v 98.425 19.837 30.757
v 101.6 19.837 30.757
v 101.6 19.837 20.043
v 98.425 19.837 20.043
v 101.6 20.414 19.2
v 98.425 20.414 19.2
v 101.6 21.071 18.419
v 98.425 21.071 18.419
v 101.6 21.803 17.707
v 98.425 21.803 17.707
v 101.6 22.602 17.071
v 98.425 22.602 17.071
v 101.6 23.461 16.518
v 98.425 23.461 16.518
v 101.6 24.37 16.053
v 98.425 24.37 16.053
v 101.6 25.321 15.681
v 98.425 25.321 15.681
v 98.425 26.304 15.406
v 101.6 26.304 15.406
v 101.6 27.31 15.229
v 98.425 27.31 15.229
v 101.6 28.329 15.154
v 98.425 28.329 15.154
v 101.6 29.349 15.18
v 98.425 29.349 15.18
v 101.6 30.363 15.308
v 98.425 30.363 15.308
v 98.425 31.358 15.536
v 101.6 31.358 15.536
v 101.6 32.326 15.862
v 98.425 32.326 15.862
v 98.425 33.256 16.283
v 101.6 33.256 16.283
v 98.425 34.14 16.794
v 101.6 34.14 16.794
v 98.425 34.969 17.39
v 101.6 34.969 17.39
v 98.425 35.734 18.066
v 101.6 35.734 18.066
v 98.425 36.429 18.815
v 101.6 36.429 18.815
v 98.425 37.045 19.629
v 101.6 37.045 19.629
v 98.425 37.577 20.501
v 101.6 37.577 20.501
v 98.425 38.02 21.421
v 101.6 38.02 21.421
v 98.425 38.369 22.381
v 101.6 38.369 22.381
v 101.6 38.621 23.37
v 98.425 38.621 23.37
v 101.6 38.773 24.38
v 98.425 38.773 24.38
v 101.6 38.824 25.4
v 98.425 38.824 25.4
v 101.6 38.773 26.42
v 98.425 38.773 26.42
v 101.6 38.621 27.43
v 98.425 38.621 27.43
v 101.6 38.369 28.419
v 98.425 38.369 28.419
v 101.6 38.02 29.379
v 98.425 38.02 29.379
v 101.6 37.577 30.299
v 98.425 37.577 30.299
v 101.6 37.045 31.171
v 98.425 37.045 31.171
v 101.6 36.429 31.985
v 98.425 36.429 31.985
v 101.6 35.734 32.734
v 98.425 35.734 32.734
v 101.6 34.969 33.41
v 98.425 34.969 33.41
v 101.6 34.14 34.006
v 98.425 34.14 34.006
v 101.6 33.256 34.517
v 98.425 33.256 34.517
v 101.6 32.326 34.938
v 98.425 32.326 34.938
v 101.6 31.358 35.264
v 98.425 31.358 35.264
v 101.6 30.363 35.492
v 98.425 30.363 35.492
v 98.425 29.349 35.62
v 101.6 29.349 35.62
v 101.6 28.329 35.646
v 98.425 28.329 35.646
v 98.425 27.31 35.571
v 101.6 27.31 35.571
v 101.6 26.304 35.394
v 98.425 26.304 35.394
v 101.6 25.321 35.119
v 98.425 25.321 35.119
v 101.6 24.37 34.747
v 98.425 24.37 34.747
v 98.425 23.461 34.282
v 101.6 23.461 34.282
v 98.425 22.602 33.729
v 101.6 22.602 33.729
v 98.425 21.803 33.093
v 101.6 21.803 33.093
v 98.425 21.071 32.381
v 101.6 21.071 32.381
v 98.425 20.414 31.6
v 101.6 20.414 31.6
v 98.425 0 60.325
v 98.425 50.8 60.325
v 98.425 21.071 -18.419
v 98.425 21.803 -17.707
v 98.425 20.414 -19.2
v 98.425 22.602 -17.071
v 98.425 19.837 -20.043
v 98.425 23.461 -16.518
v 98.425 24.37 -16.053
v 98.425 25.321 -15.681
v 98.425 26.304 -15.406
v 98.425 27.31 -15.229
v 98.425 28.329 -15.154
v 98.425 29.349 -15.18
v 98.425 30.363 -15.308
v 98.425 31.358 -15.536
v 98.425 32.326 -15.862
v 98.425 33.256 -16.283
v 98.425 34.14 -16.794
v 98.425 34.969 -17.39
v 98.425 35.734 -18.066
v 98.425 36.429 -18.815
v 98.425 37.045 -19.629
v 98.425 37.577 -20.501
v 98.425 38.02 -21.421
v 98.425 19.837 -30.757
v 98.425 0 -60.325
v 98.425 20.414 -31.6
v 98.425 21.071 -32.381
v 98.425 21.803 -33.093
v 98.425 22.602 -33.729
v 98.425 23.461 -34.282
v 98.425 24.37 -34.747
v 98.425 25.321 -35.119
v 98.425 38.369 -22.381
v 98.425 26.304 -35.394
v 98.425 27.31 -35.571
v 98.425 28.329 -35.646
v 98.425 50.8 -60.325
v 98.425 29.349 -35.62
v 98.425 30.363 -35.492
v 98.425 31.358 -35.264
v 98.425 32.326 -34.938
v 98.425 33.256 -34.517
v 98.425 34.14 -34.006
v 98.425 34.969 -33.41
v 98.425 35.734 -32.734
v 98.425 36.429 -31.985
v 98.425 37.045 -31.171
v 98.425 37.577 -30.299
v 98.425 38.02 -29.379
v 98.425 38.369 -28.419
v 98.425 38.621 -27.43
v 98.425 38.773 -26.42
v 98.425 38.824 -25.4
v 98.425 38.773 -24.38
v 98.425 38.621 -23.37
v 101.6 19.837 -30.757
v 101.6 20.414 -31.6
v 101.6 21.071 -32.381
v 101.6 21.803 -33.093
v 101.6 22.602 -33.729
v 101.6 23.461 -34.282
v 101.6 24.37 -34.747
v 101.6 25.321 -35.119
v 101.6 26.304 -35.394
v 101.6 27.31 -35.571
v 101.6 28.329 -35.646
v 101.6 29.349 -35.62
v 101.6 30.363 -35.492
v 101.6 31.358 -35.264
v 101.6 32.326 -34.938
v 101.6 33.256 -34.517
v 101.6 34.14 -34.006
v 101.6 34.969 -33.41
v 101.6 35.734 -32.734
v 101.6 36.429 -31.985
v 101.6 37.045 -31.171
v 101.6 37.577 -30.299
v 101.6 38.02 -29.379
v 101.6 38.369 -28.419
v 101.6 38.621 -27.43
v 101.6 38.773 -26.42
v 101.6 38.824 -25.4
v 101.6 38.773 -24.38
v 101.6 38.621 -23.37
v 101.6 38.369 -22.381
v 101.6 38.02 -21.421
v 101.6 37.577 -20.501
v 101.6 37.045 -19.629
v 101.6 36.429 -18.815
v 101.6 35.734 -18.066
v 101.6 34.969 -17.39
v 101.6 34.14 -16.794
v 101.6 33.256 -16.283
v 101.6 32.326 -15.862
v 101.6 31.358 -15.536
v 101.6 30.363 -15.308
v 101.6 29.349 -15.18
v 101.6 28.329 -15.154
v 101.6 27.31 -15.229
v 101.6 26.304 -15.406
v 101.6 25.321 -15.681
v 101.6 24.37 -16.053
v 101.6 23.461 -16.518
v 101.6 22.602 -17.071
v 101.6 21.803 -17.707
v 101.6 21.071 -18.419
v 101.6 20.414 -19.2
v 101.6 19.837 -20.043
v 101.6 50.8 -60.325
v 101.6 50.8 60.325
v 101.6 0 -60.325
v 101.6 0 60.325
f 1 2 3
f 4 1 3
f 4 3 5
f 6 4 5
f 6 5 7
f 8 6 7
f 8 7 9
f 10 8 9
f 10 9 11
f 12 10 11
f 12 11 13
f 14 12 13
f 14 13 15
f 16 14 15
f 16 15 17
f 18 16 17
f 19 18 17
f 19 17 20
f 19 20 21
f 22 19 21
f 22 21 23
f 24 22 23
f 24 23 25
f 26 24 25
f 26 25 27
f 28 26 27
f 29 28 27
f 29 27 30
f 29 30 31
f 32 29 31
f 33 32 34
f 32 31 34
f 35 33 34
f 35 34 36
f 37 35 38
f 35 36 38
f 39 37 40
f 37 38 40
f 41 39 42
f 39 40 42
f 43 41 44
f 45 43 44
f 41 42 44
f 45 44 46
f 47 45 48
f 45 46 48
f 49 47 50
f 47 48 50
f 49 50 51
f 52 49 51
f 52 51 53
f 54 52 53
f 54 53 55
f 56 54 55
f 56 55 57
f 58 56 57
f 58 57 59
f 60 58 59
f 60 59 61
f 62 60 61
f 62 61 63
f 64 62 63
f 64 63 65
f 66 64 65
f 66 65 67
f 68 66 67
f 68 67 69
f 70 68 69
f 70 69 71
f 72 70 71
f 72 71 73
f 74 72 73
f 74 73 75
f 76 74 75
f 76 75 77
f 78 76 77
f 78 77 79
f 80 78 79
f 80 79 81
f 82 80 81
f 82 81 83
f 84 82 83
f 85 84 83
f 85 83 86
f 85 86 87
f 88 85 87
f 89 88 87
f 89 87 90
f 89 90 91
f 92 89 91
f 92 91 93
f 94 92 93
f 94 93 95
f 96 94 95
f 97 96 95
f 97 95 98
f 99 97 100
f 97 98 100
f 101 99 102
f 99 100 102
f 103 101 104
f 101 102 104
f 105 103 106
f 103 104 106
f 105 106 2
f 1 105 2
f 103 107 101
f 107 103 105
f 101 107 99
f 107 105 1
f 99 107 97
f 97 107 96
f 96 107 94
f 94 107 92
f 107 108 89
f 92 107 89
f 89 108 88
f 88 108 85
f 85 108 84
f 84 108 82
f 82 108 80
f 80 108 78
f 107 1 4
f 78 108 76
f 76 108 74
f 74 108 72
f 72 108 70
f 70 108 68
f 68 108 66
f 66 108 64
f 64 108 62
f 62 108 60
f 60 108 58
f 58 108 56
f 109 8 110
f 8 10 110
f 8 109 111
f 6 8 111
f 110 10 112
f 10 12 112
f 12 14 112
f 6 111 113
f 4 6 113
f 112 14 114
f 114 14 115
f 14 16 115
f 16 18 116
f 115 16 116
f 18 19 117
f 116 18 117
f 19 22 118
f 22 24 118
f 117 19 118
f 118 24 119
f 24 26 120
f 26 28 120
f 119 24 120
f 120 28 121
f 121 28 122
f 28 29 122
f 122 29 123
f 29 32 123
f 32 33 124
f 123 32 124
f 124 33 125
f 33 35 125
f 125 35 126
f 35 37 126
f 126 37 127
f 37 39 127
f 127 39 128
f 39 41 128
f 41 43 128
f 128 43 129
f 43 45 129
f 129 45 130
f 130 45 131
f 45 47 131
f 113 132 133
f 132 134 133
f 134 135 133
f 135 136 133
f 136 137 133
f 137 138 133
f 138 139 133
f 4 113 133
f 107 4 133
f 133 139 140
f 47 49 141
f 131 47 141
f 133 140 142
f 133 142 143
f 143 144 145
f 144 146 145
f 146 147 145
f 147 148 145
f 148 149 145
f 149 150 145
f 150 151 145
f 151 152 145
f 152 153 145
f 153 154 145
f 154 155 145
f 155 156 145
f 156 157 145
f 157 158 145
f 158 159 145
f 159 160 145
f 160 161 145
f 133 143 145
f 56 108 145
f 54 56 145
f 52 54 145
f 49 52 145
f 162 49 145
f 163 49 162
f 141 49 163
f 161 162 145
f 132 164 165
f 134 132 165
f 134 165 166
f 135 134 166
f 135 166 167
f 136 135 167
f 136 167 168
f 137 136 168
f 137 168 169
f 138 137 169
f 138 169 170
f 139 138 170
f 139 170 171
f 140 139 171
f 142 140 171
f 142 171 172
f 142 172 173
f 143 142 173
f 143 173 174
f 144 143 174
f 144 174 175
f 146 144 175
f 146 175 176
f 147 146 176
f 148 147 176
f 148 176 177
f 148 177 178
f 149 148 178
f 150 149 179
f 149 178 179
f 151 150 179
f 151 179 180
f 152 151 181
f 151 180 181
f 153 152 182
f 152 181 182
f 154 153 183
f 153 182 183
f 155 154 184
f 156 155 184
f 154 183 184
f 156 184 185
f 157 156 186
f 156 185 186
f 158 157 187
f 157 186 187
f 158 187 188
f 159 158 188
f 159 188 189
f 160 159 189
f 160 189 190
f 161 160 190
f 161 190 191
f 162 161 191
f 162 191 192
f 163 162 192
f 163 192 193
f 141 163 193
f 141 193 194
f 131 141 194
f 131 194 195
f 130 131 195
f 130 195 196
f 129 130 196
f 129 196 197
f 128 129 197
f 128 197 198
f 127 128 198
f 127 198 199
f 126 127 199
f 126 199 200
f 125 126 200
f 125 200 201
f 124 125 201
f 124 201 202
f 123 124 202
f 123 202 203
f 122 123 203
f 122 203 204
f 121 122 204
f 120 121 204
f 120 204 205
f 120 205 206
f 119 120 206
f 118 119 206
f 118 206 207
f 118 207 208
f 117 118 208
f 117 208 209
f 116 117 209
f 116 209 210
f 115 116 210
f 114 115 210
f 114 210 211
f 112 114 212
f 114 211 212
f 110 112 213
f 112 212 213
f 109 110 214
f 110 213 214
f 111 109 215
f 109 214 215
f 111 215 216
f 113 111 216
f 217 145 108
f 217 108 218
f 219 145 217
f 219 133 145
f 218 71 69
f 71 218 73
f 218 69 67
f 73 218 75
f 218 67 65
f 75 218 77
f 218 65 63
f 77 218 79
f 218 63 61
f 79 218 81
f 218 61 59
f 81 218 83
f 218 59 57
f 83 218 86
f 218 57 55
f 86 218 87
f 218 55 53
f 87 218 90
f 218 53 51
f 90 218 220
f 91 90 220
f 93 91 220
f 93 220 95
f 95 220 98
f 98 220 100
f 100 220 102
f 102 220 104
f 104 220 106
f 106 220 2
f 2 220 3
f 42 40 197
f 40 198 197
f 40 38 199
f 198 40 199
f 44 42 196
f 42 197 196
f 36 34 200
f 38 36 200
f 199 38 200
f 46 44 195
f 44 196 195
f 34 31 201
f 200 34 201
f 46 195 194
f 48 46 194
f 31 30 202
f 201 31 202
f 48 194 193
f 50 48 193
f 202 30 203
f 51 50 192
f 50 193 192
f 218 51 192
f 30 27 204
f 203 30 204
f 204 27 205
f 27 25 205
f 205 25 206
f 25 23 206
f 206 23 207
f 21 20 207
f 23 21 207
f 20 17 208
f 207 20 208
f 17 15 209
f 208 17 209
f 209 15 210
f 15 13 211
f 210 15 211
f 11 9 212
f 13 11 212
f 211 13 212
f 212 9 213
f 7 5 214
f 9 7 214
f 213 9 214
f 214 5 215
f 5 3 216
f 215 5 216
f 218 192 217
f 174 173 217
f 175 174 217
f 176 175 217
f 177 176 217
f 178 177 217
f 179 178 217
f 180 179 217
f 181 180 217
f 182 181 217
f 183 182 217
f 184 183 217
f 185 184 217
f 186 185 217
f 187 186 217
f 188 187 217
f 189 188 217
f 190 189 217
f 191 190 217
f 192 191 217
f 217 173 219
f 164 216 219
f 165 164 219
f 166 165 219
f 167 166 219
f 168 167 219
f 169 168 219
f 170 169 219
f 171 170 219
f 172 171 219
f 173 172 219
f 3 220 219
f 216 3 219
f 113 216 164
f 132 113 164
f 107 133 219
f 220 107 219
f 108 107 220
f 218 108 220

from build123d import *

# Parameters (mm, degrees)
SKETCH1_W           = 203.2
SKETCH1_H           = 120.65
BOSS_EXTRUDE1_DEPTH = 50.8
SKETCH2_W           = 196.85
SKETCH2_H           = 114.3
CUT_EXTRUDE1_DEPTH  = 51.8
SKETCH4_W           = 203.2
SKETCH4_H           = 120.65
SKETCH4_W_2         = 196.85
SKETCH4_H_2         = 114.3
BOSS_EXTRUDE2_DEPTH = 6.35
CUT_EXTRUDE5_DEPTH  = 121.65
CUT_EXTRUDE6_REACH  = 205.2
CUT_EXTRUDE7_REACH  = 205.2
SKETCH13_R          = 12.55395
SKETCH14_W          = 200.025
SKETCH14_H          = 120.65
CUT_EXTRUDE8_DEPTH  = 51.8


with BuildPart() as part:
    # Sketch1 → Boss-Extrude1 (new body)
    with BuildSketch(Plane(origin=(0, 0, 0), x_dir=(1, 0, 0), z_dir=(0, 1, 0))):
        Rectangle(SKETCH1_W, SKETCH1_H)
    extrude(amount=BOSS_EXTRUDE1_DEPTH)

    # Sketch2 → Cut-Extrude1 (cut, through all)
    with BuildSketch(Plane(origin=(0, 50.8, 0), x_dir=(1, 0, 0), z_dir=(0, 1, 0))):
        Rectangle(SKETCH2_W, SKETCH2_H)
    extrude(amount=-CUT_EXTRUDE1_DEPTH, mode=Mode.SUBTRACT)

    # Sketch4 → Boss-Extrude2 (add)
    with BuildSketch(Plane(origin=(0, 50.8, 0), x_dir=(1, 0, 0), z_dir=(0, 1, 0))):
        Rectangle(SKETCH4_W, SKETCH4_H)
        Rectangle(SKETCH4_W_2, SKETCH4_H_2, mode=Mode.SUBTRACT)
    extrude(amount=-BOSS_EXTRUDE2_DEPTH)

    # Sketch10 → Cut-Extrude5 (cut, through all)
    with BuildSketch(Plane.XY.offset(60.325)):
        with BuildLine():
            ThreePointArc((-65.9511, 22.225), (-81.206975571, 31.167602912), (-81.556705839, 13.4874))
            Line((-81.556705839, 13.4874), (-70.843294161, 13.4874))
            ThreePointArc((-70.843294161, 13.4874), (-67.257397088, 17.218024429), (-65.9511, 22.225))
        make_face()
        with BuildLine():
            ThreePointArc((-15.1511, 22.225), (-30.406975571, 31.167602912), (-30.756705839, 13.4874))
            Line((-30.756705839, 13.4874), (-20.043294161, 13.4874))
            ThreePointArc((-20.043294161, 13.4874), (-16.457397088, 17.218024429), (-15.1511, 22.225))
        make_face()
        with BuildLine():
            ThreePointArc((35.6489, 22.225), (20.393024429, 31.167602912), (20.043294161, 13.4874))
            Line((20.043294161, 13.4874), (30.756705839, 13.4874))
            ThreePointArc((30.756705839, 13.4874), (34.342602912, 17.218024429), (35.6489, 22.225))
        make_face()
        with BuildLine():
            Line((70.843294161, 13.4874), (81.556705839, 13.4874))
            ThreePointArc((81.556705839, 13.4874), (85.142602912, 17.218024429), (86.4489, 22.225))
            ThreePointArc((86.4489, 22.225), (71.193024429, 31.167602912), (70.843294161, 13.4874))
        make_face()
    extrude(amount=-CUT_EXTRUDE5_DEPTH, mode=Mode.SUBTRACT)

    # Sketch12 → Cut-Extrude6 (cut, up to next)
    with BuildSketch(Plane(origin=(101.6, 0, 0), x_dir=(0, 0, -1), z_dir=(1, 0, 0)), mode=Mode.PRIVATE) as cut_extrude6_sk1:
        with BuildLine():
            ThreePointArc((-20.043294161, 19.8374), (-25.4, 38.8239), (-30.756705839, 19.8374))
            Line((-30.756705839, 19.8374), (-20.043294161, 19.8374))
        make_face()
    cut_extrude6_tool1 = extrude(cut_extrude6_sk1.sketch, amount=-CUT_EXTRUDE6_REACH, mode=Mode.PRIVATE) & part.part
    add(cut_extrude6_tool1.solids().sort_by_distance((101.6, 28.896198, 25.4))[0], mode=Mode.SUBTRACT)
    # Sketch12 → Cut-Extrude6 (cut, up to next)
    with BuildSketch(Plane(origin=(101.6, 0, 0), x_dir=(0, 0, -1), z_dir=(1, 0, 0)), mode=Mode.PRIVATE) as cut_extrude6_sk2:
        with BuildLine():
            ThreePointArc((30.756705839, 19.8374), (25.4, 38.8239), (20.043294161, 19.8374))
            Line((20.043294161, 19.8374), (30.756705839, 19.8374))
        make_face()
    cut_extrude6_tool2 = extrude(cut_extrude6_sk2.sketch, amount=-CUT_EXTRUDE6_REACH, mode=Mode.PRIVATE) & part.part
    add(cut_extrude6_tool2.solids().sort_by_distance((101.6, 28.896198, -25.4))[0], mode=Mode.SUBTRACT)

    # Sketch13 → Cut-Extrude7 (cut, up to next)
    with BuildSketch(Plane.ZY.offset(101.6), mode=Mode.PRIVATE) as cut_extrude7_sk1:
        with Locations((15.875, 28.575)):
            Circle(SKETCH13_R)
    cut_extrude7_tool1 = extrude(cut_extrude7_sk1.sketch, amount=-CUT_EXTRUDE7_REACH, mode=Mode.PRIVATE) & part.part
    add(cut_extrude7_tool1.solids().sort_by_distance((-101.6, 28.575, 15.875))[0], mode=Mode.SUBTRACT)

    # Sketch14 → Cut-Extrude8 (cut, through all)
    with BuildSketch(Plane(origin=(0, 50.8, 0), x_dir=(1, 0, 0), z_dir=(0, 1, 0))):
        with Locations((-1.5875, 0)):
            Rectangle(SKETCH14_W, SKETCH14_H)
    extrude(amount=-CUT_EXTRUDE8_DEPTH, mode=Mode.SUBTRACT)


solid = part.part
